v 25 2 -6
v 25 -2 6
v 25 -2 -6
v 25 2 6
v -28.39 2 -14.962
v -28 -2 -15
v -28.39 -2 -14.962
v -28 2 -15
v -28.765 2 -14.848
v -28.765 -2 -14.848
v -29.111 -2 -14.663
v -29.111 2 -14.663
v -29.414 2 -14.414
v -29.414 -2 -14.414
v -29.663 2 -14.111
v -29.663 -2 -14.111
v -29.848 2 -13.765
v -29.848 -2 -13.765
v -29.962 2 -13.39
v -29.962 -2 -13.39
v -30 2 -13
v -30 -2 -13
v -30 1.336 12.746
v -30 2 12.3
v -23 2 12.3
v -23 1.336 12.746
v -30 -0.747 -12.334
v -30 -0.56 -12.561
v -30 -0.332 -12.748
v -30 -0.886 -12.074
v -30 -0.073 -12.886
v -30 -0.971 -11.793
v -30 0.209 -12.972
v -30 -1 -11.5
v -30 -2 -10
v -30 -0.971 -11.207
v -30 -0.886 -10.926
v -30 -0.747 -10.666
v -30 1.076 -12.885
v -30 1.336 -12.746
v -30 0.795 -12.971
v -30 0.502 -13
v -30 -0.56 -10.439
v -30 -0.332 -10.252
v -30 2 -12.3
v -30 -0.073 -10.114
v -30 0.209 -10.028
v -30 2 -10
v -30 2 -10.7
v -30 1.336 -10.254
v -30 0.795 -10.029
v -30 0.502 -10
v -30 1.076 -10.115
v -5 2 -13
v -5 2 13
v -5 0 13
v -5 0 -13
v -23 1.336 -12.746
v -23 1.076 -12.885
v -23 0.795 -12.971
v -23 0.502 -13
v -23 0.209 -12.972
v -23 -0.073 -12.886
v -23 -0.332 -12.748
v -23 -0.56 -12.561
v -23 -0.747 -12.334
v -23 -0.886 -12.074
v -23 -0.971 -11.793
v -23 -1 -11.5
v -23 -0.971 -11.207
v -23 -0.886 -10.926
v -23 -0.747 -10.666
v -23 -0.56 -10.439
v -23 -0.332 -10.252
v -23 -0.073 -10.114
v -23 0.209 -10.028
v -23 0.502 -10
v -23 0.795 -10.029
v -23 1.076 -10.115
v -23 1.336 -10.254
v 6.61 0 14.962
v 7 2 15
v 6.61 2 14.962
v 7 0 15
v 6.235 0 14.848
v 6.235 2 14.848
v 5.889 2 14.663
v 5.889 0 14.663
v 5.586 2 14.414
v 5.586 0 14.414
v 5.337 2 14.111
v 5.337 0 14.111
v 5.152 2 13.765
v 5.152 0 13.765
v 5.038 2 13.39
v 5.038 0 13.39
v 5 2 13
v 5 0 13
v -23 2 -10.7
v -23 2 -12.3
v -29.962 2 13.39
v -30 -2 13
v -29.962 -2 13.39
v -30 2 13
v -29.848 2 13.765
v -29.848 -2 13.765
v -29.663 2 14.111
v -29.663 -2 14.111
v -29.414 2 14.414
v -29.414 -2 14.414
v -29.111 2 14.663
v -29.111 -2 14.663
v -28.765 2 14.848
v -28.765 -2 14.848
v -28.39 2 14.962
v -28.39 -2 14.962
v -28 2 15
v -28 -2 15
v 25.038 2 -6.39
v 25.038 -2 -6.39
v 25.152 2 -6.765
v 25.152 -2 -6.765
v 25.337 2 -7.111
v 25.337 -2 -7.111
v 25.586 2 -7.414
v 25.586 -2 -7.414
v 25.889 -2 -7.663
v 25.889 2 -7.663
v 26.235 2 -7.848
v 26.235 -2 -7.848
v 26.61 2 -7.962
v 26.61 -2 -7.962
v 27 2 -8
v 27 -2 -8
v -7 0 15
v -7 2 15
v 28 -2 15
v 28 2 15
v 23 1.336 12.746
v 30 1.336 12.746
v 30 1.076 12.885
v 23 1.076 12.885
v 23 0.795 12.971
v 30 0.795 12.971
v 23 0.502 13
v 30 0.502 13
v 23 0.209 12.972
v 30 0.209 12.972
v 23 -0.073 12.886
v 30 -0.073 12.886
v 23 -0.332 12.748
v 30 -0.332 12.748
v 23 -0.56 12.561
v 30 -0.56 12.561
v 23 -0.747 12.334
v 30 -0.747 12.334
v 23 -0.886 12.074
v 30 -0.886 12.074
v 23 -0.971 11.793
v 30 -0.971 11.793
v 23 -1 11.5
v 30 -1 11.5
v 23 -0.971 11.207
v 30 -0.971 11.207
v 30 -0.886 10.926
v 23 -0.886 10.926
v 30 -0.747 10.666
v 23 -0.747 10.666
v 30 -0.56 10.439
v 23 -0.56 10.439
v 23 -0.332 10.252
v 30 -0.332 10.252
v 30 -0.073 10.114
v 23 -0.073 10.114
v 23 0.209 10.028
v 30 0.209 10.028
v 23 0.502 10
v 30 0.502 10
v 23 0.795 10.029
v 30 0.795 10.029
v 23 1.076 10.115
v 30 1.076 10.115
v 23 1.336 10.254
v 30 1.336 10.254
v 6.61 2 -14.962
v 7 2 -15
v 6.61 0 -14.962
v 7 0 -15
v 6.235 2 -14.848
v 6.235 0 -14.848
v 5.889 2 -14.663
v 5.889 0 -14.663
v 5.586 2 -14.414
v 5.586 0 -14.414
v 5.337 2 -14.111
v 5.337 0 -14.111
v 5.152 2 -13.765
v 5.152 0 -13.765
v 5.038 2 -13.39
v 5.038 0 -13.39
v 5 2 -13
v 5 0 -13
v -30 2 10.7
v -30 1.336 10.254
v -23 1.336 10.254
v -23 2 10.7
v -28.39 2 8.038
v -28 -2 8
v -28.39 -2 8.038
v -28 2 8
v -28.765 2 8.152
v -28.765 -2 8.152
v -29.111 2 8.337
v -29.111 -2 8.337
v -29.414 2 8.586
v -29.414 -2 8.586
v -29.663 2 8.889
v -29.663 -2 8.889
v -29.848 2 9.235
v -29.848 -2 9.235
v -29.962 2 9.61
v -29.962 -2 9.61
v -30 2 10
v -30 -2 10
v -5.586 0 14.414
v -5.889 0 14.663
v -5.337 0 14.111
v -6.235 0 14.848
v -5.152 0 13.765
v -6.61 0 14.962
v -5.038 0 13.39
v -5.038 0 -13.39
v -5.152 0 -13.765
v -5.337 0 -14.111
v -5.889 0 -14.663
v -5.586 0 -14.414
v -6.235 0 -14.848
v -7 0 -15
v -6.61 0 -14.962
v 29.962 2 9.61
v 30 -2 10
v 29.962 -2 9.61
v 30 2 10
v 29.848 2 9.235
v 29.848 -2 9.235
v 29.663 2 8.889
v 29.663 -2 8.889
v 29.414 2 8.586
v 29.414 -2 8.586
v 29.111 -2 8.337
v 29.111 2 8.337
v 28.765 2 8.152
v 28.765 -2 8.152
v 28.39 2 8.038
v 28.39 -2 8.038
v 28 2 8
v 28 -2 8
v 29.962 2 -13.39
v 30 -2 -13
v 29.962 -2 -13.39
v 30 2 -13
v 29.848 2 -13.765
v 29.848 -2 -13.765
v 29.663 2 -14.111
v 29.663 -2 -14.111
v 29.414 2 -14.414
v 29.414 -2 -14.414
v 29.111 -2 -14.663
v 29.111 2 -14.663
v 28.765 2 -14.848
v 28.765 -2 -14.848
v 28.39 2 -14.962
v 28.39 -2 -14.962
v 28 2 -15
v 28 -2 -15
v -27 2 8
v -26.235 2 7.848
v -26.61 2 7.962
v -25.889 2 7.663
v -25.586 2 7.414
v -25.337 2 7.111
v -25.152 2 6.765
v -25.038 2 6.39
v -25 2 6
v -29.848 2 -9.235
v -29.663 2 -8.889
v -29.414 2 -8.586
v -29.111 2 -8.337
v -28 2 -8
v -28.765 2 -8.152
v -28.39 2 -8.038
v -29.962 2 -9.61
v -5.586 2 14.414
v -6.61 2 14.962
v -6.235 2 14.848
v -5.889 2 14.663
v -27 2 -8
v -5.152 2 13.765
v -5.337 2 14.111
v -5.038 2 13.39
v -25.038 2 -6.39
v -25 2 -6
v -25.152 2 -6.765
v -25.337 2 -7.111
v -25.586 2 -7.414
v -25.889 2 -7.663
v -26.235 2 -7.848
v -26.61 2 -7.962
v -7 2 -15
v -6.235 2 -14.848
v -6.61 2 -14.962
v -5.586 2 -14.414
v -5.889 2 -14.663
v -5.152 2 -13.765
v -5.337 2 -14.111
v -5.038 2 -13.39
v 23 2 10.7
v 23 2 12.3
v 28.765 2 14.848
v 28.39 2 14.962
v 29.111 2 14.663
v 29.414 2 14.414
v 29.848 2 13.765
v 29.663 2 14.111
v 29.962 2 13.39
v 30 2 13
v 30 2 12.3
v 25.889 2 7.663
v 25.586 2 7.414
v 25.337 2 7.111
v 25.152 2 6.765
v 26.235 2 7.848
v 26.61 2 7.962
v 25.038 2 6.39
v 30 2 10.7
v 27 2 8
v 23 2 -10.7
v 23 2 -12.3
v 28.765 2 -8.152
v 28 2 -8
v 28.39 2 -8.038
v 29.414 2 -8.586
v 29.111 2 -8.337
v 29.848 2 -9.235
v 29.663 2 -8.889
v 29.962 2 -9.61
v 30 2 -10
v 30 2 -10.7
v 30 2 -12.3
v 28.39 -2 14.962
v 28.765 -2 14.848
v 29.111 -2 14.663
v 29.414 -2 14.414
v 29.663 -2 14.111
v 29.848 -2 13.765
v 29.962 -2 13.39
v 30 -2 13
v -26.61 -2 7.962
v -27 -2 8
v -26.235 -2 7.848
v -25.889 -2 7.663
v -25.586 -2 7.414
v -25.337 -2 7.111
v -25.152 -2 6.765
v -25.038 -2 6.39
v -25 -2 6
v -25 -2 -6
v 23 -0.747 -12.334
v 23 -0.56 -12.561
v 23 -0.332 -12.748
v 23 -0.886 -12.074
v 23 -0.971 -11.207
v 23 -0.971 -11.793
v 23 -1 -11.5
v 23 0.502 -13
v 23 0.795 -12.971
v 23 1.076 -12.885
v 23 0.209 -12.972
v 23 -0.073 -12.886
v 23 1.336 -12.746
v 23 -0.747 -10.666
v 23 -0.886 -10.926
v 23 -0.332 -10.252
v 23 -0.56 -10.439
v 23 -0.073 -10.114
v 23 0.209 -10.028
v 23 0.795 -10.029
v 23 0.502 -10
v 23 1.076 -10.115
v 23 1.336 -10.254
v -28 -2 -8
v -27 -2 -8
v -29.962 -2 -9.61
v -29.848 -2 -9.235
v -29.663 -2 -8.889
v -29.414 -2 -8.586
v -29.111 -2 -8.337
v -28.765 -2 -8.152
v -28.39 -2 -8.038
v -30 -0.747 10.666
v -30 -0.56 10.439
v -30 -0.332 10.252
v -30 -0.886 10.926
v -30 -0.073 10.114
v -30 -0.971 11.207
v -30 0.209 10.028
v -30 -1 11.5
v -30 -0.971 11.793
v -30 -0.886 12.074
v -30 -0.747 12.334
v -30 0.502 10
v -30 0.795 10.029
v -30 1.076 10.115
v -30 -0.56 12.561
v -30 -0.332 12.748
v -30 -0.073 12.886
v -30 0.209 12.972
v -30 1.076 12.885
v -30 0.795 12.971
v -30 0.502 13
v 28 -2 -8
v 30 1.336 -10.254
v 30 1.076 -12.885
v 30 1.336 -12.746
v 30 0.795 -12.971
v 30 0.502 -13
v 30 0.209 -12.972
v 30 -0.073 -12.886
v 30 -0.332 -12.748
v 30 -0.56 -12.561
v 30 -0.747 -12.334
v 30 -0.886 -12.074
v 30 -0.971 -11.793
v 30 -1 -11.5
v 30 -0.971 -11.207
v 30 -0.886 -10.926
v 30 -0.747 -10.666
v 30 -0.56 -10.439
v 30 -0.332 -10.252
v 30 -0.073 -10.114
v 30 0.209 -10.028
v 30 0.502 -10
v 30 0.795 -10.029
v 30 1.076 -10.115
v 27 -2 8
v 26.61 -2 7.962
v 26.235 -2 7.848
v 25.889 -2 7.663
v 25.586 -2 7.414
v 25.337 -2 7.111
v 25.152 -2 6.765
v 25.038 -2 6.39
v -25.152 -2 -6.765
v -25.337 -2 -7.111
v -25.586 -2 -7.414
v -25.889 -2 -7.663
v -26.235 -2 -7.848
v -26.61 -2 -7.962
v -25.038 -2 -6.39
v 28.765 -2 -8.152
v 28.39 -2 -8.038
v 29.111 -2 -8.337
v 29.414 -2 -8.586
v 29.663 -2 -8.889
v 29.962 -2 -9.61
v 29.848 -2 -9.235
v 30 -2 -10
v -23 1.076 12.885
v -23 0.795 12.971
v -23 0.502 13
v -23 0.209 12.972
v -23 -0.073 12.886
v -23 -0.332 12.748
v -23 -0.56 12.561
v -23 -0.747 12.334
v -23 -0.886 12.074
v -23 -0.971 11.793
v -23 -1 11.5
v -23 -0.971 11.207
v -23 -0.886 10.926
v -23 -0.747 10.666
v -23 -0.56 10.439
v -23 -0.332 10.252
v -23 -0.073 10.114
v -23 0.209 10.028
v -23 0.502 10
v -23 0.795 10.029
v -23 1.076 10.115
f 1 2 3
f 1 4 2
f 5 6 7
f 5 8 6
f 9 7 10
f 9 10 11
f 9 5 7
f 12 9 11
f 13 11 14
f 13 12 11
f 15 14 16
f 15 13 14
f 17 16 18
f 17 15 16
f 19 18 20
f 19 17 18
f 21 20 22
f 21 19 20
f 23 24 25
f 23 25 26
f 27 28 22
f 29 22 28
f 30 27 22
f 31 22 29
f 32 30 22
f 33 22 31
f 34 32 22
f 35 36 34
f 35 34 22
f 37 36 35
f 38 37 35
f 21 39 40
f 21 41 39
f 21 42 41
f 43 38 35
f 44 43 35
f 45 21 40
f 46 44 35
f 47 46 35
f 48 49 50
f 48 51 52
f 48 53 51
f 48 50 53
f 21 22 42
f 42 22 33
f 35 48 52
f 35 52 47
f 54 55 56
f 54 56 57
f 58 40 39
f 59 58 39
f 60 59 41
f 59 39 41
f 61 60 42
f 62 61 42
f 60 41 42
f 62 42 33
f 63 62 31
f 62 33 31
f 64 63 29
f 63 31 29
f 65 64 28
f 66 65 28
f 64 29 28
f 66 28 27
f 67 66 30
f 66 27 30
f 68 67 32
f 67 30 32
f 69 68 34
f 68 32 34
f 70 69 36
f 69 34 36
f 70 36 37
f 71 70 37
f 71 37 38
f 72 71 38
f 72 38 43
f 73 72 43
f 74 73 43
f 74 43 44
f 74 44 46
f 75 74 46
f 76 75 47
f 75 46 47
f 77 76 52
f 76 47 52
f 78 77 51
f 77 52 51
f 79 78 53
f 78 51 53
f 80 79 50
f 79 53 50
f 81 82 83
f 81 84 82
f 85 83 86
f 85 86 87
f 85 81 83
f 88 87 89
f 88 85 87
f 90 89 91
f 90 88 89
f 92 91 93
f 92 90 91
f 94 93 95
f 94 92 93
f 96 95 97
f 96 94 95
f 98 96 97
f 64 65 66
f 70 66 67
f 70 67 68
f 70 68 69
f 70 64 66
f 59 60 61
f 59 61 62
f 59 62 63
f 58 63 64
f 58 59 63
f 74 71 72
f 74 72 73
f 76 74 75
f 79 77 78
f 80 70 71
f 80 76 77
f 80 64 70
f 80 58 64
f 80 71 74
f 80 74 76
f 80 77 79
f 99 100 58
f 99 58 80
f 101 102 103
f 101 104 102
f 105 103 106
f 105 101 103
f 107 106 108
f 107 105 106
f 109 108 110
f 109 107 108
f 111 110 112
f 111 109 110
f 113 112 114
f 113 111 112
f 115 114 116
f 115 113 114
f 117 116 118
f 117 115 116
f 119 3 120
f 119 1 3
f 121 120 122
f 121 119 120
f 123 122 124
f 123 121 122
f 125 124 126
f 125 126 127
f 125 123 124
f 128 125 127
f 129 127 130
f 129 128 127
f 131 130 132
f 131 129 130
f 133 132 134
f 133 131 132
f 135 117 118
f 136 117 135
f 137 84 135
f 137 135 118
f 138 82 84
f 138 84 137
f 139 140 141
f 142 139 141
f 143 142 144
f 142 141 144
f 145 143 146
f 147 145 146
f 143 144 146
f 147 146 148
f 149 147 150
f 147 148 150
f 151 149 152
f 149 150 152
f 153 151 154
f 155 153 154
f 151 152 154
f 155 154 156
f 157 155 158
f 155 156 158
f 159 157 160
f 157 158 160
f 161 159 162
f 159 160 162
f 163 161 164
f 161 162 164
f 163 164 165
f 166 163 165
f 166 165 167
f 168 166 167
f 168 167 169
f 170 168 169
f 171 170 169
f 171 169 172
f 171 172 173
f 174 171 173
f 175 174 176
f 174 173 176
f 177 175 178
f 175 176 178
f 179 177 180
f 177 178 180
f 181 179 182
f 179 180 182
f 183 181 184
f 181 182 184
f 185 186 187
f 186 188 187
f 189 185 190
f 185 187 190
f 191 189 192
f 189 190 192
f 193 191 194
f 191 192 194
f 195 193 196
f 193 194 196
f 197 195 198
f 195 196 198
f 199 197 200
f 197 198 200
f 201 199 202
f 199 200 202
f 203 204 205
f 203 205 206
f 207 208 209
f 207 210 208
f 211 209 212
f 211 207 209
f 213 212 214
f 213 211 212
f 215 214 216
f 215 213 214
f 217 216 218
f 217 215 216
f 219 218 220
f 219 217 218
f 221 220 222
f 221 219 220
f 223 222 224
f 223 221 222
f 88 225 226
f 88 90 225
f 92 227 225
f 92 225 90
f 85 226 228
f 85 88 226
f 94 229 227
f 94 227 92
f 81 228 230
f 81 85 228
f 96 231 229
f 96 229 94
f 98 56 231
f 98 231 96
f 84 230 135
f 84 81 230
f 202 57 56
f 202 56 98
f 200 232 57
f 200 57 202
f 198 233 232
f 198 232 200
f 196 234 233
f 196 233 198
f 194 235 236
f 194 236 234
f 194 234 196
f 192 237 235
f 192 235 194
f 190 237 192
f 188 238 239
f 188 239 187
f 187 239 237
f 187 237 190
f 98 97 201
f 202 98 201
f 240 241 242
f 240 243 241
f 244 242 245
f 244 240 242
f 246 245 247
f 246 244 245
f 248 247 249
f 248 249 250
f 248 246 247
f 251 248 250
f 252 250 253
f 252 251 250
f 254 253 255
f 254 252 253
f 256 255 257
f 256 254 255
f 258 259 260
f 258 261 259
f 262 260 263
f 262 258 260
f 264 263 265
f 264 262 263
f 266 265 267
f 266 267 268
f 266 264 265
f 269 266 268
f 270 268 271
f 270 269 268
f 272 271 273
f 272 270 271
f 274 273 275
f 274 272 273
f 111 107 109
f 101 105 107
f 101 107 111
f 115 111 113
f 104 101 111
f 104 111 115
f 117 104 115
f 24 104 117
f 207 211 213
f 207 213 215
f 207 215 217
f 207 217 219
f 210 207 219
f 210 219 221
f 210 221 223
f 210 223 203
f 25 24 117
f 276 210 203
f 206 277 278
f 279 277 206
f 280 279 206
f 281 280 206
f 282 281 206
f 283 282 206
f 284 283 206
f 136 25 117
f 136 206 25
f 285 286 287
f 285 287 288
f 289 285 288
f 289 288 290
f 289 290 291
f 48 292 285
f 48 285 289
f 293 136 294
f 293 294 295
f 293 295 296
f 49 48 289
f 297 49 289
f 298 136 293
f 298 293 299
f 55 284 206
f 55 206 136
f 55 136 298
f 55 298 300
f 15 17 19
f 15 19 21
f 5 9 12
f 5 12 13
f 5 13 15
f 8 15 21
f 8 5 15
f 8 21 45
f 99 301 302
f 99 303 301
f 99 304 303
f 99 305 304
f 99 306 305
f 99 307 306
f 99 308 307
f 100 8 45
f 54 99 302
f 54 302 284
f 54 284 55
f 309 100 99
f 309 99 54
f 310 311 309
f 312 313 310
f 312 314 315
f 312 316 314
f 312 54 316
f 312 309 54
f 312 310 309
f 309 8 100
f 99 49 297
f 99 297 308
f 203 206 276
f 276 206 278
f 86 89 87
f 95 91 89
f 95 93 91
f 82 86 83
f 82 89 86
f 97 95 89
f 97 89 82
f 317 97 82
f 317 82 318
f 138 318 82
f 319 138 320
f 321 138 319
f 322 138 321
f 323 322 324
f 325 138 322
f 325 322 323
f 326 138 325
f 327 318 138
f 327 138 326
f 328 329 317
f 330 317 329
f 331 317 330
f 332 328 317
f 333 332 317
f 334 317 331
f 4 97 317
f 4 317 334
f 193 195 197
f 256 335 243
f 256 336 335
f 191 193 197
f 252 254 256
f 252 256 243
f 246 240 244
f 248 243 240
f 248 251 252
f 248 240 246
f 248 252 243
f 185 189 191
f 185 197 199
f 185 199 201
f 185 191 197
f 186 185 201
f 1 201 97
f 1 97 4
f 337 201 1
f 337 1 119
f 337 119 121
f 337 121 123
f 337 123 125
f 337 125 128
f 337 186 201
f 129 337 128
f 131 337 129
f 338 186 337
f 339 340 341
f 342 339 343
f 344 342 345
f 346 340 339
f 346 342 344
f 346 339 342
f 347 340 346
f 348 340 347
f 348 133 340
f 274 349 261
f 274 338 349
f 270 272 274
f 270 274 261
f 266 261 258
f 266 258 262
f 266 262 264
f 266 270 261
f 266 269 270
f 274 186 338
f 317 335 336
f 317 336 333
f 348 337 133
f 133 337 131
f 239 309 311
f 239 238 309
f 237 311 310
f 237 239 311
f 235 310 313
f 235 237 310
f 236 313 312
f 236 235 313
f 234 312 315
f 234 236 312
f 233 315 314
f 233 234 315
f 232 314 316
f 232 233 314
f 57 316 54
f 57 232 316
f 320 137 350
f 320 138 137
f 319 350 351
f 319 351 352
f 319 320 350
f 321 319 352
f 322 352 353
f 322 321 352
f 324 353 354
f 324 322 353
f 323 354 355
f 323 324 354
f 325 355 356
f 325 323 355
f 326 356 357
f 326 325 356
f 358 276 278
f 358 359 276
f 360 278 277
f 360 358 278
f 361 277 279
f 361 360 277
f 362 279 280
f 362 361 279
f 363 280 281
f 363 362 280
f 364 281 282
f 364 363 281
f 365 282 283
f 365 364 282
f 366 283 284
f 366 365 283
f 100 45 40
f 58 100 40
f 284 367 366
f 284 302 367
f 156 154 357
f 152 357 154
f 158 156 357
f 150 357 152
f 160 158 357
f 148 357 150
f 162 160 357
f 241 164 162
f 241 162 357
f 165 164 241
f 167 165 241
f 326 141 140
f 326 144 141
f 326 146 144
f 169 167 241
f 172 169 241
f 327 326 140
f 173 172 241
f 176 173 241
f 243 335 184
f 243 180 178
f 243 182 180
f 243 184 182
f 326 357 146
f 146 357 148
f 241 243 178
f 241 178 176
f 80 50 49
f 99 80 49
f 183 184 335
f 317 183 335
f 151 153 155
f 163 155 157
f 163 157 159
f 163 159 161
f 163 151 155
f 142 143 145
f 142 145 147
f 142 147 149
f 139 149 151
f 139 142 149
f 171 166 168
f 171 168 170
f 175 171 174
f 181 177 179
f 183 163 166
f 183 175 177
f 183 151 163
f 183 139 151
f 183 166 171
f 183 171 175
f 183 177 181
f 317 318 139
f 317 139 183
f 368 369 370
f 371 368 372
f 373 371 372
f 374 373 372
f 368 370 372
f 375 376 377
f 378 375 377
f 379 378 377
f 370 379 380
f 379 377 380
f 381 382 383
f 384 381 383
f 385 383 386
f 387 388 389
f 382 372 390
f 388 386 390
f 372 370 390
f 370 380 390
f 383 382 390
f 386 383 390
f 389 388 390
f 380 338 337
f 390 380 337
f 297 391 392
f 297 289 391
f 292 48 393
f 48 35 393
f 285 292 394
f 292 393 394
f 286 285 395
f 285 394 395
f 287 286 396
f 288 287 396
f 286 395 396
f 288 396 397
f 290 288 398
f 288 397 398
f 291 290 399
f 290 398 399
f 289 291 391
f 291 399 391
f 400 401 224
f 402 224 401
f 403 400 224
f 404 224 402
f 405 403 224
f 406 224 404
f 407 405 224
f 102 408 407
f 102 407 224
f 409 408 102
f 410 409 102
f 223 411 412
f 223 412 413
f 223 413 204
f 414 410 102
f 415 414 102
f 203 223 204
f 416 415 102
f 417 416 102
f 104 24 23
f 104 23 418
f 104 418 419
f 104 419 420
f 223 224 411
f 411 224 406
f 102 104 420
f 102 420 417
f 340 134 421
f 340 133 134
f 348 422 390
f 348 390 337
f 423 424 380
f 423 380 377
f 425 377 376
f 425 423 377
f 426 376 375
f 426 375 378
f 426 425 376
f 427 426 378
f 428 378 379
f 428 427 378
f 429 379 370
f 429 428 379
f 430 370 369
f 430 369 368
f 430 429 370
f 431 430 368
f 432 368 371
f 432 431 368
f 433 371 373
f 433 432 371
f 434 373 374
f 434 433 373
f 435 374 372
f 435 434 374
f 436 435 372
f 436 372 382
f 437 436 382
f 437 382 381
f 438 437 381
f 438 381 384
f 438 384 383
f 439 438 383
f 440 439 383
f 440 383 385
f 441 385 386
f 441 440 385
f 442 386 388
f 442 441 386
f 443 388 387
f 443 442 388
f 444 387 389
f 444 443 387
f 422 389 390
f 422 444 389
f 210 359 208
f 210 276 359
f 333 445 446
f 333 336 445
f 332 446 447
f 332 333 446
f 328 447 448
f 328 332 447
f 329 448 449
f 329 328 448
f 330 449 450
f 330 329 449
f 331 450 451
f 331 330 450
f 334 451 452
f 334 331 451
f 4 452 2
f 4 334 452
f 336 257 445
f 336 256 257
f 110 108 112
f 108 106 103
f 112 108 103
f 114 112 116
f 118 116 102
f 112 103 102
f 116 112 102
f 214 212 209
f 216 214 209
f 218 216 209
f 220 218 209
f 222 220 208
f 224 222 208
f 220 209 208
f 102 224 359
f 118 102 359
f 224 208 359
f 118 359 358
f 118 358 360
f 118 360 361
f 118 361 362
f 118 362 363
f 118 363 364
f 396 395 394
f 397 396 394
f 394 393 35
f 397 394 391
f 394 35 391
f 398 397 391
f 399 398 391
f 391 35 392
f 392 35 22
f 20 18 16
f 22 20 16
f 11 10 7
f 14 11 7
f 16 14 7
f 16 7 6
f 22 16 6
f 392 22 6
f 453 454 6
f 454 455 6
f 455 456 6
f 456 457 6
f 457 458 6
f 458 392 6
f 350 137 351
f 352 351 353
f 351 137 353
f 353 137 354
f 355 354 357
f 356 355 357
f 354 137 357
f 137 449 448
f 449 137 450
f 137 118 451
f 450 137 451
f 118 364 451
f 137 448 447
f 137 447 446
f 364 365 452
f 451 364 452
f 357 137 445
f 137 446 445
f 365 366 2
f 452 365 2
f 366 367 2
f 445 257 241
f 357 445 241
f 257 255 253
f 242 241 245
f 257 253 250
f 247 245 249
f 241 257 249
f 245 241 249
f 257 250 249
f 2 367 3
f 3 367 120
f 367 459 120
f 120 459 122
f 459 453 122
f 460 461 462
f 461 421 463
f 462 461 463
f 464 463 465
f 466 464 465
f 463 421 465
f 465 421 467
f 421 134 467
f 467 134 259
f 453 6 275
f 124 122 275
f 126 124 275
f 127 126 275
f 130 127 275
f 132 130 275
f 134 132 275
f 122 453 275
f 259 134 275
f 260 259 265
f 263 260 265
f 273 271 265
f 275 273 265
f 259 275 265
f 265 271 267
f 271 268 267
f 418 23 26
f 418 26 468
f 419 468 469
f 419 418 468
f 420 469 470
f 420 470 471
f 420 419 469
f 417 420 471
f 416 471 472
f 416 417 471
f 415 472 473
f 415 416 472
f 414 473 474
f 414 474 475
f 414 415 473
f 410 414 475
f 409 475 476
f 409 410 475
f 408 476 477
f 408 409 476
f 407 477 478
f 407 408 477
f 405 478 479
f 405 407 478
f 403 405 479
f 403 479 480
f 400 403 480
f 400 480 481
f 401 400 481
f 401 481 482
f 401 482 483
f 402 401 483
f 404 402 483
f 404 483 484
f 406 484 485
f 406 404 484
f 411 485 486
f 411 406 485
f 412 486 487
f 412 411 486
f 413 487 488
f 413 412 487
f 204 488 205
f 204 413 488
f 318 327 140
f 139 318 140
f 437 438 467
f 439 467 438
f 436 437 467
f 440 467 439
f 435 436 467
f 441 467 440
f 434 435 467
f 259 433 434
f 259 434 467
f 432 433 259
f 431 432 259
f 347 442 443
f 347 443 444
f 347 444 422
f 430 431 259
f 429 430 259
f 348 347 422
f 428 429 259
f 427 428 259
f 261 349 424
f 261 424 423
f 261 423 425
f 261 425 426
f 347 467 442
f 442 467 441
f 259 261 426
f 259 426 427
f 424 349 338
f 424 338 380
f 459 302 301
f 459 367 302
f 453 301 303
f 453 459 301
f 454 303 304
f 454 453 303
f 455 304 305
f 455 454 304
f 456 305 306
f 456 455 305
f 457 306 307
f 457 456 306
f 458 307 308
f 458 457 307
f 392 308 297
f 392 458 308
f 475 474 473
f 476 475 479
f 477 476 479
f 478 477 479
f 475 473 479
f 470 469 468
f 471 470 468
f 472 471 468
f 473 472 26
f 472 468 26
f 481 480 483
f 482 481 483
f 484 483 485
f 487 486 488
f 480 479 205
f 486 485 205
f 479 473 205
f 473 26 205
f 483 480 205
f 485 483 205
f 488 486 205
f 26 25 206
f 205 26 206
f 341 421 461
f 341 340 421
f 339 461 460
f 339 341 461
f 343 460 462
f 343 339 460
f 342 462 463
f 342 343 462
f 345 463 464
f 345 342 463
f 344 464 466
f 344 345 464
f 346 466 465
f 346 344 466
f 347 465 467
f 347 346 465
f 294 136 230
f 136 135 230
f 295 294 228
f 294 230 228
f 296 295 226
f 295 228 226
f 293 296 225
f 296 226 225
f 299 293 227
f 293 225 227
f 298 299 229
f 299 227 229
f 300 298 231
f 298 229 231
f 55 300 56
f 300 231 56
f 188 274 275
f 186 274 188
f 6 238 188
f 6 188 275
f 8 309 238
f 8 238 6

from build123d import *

# Parameters (mm, degrees)
BOSS_EXTRUDE1_DEPTH  = 2
CUT_EXTRUDE1_DEPTH   = 7
MIRROR2_COPY_1_DEPTH = 7
SKETCH4_W            = 10
SKETCH4_H            = 30
CUT_EXTRUDE2_DEPTH   = 2
FILLET1_R            = 2


with BuildPart() as part:
    # Sketch2 → Boss-Extrude1 (new, symmetric)
    with BuildSketch(Plane(origin=(0, 0, 0), x_dir=(1, 0, 0), z_dir=(0, 1, 0))):
        Polygon((-25, -8), (-30, -8), (-30, -15), (30, -15), (30, -8), (25, -8), (25, 8), (30, 8), (30, 15), (-30, 15), (-30, 8), (-25, 8), align=None)
    extrude(amount=BOSS_EXTRUDE1_DEPTH, both=True)

    # Sketch3 → Cut-Extrude1 (cut)
    with BuildSketch(Plane(origin=(30, 0, 0), x_dir=(0, 0, -1), z_dir=(1, 0, 0))):
        with BuildLine():
            Line((-12.3, 2), (-12.74567474, 1.335640138))
            ThreePointArc((-12.74567474, 1.335640138), (-11.5, -1), (-10.25432526, 1.335640138))
            Line((-10.25432526, 1.335640138), (-10.7, 2))
            Line((-10.7, 2), (-12.3, 2))
        make_face()
    cut_extrude1 = extrude(amount=-CUT_EXTRUDE1_DEPTH, mode=Mode.SUBTRACT)

    # Mirror1: Cut-Extrude1 across plane
    add(cut_extrude1.mirror(Plane(origin=(0, 0, 0), x_dir=(0, 0, 1), z_dir=(1, 0, 0))), mode=Mode.SUBTRACT)

    # Mirror2: Cut-Extrude1 across plane
    add(cut_extrude1.mirror(Plane.XY), mode=Mode.SUBTRACT)

    # Mirror2 copy 1 sketch → Mirror2 copy 1 (cut)
    with BuildSketch(Plane.ZY.offset(30)):
        with BuildLine():
            Line((-12.3, 2), (-12.74567474, 1.335640138))
            ThreePointArc((-12.74567474, 1.335640138), (-11.5, -1), (-10.25432526, 1.335640138))
            Line((-10.25432526, 1.335640138), (-10.7, 2))
            Line((-10.7, 2), (-12.3, 2))
        make_face()
    extrude(amount=-MIRROR2_COPY_1_DEPTH, mode=Mode.SUBTRACT)

    # Sketch4 → Cut-Extrude2 (cut)
    with BuildSketch(Plane(origin=(0, 2, 0), x_dir=(1, 0, 0), z_dir=(0, 1, 0))):
        Rectangle(SKETCH4_W, SKETCH4_H)
    extrude(amount=-CUT_EXTRUDE2_DEPTH, mode=Mode.SUBTRACT)

    # Fillet1
    fillet1_edges = [part.edges().sort_by_distance(p)[0] for p in [
        (5, 1, -15),
        (5, 1, 15),
        (-5, 1, 15),
        (-5, 1, -15),
        (-25, 0, -8),
        (-30, 0, -8),
        (-30, 0, -15),
        (30, 0, -15),
        (30, 0, -8),
        (25, 0, -8),
        (25, 0, 8),
        (30, 0, 8),
        (30, 0, 15),
        (-30, 0, 15),
        (-30, 0, 8),
        (-25, 0, 8),
    ]]
    fillet(fillet1_edges, radius=FILLET1_R - 0.0001)  # a hair under: the kernel refuses the full size


solid = part.part
